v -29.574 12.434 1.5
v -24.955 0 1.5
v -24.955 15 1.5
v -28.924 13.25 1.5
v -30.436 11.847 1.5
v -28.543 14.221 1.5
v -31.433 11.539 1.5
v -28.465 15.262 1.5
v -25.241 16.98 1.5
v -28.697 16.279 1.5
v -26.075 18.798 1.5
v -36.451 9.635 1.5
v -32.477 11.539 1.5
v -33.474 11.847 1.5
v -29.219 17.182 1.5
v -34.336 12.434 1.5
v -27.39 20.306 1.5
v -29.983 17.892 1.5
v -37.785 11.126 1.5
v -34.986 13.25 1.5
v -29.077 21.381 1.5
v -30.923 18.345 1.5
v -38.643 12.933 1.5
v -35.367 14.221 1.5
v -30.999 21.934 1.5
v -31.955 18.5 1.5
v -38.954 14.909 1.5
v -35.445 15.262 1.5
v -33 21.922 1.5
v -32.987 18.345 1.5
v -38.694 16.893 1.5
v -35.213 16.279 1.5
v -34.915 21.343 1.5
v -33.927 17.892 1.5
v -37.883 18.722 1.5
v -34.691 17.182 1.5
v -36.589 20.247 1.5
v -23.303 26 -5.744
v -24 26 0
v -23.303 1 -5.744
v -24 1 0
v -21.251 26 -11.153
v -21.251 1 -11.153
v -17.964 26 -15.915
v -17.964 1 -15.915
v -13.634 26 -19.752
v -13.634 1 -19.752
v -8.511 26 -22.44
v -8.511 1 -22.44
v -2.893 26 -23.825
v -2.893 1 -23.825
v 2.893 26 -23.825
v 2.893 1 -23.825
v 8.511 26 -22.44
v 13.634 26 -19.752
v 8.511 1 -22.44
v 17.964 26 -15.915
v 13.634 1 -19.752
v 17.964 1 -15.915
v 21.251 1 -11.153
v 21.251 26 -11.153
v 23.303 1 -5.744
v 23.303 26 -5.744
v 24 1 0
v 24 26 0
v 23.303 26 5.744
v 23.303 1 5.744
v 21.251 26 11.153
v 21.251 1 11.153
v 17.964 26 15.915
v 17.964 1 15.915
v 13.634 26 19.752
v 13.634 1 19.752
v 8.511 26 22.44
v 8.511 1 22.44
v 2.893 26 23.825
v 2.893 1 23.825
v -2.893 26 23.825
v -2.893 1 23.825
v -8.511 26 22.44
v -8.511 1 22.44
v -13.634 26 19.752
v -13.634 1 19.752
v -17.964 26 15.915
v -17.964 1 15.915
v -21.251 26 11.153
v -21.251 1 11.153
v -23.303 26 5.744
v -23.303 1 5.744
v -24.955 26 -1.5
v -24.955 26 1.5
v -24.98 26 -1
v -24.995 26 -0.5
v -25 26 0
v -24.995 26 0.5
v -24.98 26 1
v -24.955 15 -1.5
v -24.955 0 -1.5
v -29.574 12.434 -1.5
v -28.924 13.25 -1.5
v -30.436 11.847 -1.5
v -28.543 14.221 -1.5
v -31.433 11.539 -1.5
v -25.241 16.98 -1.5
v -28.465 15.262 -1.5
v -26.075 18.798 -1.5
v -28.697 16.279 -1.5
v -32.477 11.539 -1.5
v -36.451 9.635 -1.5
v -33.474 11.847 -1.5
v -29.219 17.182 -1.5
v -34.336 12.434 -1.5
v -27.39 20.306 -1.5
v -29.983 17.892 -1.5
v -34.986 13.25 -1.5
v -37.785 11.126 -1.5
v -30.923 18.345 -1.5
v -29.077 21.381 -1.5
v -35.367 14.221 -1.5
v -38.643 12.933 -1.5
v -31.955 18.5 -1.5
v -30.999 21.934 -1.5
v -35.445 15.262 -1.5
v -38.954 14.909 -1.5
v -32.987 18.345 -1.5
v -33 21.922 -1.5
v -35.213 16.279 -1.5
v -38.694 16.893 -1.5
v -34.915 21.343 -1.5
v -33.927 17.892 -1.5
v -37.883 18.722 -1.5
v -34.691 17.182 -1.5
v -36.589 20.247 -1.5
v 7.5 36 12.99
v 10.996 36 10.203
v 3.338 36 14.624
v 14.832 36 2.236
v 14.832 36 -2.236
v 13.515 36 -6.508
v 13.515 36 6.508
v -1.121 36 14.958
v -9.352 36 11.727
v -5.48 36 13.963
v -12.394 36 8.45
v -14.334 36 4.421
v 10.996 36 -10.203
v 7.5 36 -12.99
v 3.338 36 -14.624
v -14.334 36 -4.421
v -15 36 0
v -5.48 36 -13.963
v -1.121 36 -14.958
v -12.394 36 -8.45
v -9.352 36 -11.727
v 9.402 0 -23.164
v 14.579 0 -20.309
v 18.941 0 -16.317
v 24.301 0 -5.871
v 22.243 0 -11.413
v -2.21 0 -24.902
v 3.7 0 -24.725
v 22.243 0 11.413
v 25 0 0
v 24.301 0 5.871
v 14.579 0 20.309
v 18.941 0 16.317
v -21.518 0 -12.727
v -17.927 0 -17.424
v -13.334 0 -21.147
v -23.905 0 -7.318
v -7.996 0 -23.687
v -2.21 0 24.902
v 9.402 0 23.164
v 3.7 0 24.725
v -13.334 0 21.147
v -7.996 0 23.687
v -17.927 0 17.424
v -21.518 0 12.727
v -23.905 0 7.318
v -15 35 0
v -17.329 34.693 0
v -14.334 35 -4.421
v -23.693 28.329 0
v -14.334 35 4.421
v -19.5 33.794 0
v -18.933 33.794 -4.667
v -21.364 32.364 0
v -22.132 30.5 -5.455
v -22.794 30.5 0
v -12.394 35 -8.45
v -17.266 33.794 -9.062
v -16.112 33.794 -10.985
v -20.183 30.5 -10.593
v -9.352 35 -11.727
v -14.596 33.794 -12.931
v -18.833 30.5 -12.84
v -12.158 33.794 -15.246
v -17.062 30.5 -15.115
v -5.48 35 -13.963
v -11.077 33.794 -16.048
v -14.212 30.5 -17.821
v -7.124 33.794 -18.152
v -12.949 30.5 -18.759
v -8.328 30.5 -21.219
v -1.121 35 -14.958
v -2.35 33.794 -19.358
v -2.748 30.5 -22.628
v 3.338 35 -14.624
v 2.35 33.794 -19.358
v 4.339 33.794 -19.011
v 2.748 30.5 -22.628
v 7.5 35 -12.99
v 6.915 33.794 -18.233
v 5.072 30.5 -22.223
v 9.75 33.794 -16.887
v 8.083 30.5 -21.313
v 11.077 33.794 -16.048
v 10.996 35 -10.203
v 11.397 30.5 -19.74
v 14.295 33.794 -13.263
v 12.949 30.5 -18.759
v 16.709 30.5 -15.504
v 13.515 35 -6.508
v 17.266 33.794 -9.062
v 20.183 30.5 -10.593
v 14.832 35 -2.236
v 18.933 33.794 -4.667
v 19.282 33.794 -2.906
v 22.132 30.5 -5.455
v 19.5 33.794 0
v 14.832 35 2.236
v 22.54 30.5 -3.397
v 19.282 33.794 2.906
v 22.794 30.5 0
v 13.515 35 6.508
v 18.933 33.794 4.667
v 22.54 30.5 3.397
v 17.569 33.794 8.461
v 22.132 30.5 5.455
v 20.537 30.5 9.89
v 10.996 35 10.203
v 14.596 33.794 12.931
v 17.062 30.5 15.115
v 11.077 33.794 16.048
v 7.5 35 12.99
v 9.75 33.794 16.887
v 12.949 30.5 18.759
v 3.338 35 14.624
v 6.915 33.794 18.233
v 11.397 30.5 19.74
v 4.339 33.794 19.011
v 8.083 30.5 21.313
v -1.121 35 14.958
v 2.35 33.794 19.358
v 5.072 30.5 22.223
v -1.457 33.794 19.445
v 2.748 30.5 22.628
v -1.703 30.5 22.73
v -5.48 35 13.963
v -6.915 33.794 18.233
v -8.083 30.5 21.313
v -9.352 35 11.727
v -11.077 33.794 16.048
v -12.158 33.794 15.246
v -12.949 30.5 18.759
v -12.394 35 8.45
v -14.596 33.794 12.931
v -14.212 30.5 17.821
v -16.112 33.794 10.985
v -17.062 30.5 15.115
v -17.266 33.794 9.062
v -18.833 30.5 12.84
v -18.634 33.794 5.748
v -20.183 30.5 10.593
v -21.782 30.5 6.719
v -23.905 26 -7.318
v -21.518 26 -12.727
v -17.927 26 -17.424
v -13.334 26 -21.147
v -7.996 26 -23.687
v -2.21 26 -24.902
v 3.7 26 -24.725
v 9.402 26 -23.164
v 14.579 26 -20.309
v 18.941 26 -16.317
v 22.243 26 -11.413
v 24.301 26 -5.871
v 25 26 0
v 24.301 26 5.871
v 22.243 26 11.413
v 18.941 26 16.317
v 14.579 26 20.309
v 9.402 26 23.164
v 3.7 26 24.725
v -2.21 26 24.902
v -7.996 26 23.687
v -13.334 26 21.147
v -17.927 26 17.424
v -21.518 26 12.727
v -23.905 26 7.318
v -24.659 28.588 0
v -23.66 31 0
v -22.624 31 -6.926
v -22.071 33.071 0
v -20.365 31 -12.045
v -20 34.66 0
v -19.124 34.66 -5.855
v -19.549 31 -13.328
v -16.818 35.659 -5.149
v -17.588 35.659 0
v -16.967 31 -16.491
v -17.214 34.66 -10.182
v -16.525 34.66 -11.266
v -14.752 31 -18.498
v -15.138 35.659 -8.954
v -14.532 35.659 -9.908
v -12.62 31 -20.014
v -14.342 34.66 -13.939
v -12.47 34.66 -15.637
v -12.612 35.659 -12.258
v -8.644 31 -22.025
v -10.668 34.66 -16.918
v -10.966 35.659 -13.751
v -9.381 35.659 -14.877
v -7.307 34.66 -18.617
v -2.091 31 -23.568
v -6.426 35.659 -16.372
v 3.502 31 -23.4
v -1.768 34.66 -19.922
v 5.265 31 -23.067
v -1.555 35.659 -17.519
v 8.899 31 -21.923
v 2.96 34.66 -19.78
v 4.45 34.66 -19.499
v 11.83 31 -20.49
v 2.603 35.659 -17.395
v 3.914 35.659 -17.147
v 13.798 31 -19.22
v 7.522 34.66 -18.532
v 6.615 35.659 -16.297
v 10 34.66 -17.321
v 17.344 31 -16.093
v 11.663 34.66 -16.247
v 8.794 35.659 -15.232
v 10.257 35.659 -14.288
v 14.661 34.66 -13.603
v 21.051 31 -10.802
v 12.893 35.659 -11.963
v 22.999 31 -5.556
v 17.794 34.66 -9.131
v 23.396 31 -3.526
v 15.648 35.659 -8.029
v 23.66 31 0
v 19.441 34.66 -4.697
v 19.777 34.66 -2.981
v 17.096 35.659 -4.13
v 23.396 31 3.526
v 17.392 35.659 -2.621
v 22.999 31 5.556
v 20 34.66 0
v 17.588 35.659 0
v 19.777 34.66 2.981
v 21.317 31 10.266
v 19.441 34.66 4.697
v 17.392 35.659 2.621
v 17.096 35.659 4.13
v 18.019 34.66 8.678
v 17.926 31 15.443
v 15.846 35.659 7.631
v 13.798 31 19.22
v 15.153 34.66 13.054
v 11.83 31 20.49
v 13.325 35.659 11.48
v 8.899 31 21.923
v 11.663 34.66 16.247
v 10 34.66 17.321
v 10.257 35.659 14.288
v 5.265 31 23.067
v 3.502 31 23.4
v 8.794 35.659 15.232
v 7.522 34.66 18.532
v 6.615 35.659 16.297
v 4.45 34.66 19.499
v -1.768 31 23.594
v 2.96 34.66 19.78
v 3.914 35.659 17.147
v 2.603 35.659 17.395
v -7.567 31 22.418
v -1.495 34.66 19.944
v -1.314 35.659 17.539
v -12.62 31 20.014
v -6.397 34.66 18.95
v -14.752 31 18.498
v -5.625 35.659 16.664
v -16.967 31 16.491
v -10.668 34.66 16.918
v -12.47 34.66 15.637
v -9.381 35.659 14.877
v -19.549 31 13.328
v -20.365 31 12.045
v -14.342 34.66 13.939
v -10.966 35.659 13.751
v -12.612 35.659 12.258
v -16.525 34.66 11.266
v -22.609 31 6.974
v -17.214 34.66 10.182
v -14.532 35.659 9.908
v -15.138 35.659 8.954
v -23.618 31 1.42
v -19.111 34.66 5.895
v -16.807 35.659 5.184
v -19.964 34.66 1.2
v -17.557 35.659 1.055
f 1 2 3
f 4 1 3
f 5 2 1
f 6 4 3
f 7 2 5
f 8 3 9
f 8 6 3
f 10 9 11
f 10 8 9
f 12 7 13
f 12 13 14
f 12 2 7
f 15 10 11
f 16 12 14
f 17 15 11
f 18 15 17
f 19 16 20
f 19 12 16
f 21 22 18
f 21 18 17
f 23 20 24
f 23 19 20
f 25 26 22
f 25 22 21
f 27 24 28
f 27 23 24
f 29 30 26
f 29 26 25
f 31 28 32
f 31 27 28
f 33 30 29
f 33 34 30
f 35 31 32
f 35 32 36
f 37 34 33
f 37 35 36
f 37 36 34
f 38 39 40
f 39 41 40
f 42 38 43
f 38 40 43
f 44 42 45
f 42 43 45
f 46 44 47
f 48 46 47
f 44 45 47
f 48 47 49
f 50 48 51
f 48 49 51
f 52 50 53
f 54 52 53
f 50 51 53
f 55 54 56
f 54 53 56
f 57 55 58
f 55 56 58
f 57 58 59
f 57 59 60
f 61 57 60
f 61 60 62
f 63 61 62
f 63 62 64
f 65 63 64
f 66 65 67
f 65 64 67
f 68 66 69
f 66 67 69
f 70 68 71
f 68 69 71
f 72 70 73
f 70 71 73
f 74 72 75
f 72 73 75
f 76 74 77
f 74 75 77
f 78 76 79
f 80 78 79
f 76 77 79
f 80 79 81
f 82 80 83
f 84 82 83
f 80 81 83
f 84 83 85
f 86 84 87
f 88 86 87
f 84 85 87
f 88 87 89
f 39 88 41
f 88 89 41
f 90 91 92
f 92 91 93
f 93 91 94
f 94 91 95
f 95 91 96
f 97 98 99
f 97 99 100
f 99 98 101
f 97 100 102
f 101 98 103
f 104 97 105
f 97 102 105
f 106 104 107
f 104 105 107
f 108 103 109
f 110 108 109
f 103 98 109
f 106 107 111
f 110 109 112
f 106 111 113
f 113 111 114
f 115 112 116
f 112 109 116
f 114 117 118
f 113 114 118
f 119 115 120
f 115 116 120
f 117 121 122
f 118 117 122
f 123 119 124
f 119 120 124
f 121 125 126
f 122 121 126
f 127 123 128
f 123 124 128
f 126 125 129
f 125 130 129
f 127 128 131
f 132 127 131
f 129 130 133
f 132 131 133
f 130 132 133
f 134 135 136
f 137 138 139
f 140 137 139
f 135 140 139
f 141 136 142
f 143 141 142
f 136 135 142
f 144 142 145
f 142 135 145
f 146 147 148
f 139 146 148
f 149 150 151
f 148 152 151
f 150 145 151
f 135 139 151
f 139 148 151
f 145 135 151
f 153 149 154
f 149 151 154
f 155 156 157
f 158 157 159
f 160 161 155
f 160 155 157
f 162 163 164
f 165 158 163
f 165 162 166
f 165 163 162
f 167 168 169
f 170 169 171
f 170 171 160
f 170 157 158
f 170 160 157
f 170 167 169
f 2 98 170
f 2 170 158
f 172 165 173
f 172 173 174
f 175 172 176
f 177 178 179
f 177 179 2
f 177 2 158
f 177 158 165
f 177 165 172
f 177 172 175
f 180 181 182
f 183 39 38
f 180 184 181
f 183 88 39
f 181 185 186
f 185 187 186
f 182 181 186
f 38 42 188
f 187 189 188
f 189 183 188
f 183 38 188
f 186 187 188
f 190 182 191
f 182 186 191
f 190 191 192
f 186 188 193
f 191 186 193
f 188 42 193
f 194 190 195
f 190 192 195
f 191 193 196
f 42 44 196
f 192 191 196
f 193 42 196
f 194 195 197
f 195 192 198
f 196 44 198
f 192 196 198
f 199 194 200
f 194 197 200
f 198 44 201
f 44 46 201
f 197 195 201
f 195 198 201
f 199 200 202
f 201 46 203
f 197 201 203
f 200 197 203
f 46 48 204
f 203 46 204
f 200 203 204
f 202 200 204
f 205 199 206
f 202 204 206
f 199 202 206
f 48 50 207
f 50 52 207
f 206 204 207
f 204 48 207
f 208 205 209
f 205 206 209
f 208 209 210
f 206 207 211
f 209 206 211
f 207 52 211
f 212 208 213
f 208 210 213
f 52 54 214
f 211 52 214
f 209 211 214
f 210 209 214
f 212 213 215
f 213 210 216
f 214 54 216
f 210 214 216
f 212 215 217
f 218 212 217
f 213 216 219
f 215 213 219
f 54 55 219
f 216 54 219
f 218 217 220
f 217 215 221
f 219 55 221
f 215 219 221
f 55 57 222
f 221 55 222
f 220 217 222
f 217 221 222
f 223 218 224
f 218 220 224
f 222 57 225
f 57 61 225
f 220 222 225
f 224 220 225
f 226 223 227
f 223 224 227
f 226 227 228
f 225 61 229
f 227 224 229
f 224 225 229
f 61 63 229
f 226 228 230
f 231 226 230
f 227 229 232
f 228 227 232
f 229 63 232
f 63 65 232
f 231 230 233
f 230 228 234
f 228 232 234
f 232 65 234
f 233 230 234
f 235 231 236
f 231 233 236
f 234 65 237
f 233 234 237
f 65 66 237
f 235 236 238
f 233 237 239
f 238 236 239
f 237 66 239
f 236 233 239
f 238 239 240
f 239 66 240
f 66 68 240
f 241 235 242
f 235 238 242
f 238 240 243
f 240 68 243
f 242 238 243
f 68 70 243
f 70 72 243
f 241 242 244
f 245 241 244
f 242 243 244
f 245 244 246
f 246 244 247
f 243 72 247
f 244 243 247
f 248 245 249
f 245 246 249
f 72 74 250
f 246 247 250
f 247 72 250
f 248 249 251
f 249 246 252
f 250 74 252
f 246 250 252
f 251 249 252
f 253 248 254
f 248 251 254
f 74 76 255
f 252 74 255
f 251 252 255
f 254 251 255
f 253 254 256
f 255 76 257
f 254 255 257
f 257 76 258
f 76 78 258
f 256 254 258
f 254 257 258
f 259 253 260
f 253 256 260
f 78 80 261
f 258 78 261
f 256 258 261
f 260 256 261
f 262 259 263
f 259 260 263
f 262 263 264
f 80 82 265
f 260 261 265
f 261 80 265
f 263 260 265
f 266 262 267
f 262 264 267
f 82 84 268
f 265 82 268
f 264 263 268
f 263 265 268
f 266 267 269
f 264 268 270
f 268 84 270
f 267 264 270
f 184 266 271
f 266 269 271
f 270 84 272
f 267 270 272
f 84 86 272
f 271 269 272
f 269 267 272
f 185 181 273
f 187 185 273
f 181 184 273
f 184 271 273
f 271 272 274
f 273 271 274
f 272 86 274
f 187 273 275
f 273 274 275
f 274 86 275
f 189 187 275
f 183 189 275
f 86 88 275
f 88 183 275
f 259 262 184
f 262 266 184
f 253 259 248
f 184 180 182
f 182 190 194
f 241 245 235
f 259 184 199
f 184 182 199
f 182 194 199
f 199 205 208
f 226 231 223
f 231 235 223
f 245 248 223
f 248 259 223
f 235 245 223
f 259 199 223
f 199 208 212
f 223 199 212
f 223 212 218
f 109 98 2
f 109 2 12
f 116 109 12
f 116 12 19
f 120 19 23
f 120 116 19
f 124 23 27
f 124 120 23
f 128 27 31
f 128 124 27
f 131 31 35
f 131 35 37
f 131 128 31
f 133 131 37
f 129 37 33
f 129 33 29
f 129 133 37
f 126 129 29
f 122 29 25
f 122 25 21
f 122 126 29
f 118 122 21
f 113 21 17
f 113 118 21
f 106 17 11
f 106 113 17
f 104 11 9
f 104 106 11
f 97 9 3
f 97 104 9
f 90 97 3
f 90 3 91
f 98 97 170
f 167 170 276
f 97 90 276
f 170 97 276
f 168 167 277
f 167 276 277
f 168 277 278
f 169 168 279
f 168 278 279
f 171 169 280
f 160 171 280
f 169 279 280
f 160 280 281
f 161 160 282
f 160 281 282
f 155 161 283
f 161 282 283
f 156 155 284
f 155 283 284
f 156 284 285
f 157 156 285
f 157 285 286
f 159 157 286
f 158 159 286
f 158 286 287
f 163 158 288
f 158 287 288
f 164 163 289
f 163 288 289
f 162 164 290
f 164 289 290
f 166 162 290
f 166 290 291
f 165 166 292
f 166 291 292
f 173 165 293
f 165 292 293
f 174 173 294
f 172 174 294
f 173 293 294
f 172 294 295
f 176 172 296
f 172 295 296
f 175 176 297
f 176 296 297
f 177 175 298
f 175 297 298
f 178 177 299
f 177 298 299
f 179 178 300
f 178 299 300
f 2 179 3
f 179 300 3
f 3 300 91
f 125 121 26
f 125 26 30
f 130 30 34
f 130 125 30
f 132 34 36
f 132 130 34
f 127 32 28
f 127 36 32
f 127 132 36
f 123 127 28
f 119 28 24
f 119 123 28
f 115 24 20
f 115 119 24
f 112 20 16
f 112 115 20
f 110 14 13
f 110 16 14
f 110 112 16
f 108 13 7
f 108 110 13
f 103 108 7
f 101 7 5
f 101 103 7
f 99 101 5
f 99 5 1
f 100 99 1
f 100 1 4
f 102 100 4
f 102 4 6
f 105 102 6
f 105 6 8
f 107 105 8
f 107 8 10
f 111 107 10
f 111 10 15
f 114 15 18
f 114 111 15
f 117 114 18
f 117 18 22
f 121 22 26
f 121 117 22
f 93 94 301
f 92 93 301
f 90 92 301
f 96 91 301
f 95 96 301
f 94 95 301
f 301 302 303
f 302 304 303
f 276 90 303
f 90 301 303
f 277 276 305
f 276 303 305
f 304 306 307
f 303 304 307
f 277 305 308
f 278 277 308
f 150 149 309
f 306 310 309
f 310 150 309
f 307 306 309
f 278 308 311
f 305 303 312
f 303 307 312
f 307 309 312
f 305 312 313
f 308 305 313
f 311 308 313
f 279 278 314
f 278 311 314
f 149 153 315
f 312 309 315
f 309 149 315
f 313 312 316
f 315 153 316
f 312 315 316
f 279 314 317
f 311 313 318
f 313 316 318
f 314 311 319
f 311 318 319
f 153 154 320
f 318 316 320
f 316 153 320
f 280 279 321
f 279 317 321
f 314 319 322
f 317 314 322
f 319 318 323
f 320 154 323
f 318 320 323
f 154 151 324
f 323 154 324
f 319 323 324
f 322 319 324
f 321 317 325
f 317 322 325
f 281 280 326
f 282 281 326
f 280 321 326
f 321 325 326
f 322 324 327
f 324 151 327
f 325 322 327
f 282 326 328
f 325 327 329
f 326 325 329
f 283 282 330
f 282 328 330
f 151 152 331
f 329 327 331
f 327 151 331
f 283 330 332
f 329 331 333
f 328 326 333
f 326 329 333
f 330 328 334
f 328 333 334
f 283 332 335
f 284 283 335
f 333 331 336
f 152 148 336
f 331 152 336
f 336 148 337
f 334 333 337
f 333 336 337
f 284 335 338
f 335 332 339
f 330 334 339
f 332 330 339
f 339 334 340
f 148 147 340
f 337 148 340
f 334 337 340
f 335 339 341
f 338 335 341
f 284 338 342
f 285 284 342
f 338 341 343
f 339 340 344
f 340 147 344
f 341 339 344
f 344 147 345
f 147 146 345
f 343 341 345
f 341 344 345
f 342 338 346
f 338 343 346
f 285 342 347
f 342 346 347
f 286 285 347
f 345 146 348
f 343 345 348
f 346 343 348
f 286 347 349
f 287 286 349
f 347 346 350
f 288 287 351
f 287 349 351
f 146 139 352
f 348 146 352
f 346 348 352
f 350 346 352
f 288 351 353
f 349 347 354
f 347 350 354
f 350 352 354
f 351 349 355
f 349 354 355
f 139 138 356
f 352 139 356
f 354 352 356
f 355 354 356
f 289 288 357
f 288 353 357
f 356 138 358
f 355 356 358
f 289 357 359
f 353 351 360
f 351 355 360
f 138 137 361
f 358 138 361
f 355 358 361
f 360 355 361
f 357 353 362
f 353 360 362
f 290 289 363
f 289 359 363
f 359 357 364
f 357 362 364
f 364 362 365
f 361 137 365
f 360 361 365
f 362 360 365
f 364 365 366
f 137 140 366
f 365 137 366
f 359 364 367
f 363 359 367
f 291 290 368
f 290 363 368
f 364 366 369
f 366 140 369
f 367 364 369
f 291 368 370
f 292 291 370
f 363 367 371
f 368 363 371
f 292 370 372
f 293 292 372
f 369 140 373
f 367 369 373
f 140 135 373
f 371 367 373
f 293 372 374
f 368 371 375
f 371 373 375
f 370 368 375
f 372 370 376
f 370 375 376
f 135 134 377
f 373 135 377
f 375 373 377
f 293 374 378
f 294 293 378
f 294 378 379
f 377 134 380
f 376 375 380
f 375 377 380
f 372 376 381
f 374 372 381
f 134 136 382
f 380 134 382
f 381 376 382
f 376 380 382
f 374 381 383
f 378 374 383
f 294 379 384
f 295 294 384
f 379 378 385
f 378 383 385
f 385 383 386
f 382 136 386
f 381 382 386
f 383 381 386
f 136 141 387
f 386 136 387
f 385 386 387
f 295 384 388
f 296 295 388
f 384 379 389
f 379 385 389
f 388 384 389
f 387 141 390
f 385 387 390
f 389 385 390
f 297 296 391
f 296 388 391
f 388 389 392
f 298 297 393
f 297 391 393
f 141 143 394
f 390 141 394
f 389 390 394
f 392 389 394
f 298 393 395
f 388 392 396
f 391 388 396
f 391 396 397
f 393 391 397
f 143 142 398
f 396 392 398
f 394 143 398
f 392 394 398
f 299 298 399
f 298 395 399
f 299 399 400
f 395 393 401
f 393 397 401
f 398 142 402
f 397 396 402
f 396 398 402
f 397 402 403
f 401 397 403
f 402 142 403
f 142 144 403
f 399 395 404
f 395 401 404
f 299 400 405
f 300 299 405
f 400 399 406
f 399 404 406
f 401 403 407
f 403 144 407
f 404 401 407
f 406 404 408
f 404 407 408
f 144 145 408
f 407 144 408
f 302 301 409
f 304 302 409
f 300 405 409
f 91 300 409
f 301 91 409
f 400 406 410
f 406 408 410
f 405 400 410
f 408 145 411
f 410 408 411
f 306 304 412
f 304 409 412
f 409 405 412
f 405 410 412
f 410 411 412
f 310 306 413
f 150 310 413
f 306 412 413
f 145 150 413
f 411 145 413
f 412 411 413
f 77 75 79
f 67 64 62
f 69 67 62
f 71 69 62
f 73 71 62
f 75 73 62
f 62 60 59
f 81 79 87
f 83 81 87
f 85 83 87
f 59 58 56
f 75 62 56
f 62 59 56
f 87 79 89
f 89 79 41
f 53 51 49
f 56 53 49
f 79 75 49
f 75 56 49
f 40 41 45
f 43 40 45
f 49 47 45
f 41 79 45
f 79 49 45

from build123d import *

# Parameters (mm, degrees)
SKETCH5_W                            = 3
SKETCH5_H                            = 26
BOSS_EXTRUDE1_DEPTH                  = 15
BOSS_EXTRUDE1_DIRECTION_2_REACH      = 68.491
BOSS_EXTRUDE1_DIRECTION_2_END_RADIUS = 25
CUT_EXTRUDE1_DEPTH                   = 60.338014797
CUT_EXTRUDE1_DEPTH_BACK              = 60.338014797
SKETCH4_R                            = 3.5


with BuildPart() as part:
    # Sketch1 → Revolve1 (revolve)
    with BuildSketch(Plane.XY, mode=Mode.PRIVATE) as revolve1_sk:
        with BuildLine():
            Line((0, 0), (25, 0))
            Line((25, 0), (25, 26))
            ThreePointArc((25, 26), (22.071067812, 33.071067812), (15, 36))
            Line((15, 36), (0, 36))
            Line((0, 36), (0, 35))
            Line((0, 35), (1, 35))
            Line((1, 35), (15, 35))
            ThreePointArc((15, 35), (21.363961031, 32.363961031), (24, 26))
            Line((24, 26), (24, 1))
            Line((24, 1), (1, 1))
            Line((1, 1), (0, 1))
            Line((0, 1), (0, 0))
        make_face()
    revolve(revolve1_sk.sketch.rotate(Axis((0, 36, 0), (0, -1, 0)), 180), axis=Axis((0, 36, 0), (0, -1, 0)))

    # Sketch5 → Boss-Extrude1 (add)
    with BuildSketch(Plane.ZY.offset(25)):
        with Locations((0, 13)):
            Rectangle(SKETCH5_W, SKETCH5_H)
    extrude(amount=BOSS_EXTRUDE1_DEPTH)

    # Boss-Extrude1 direction 2: up to this cylinder (the profile starts outside it)
    boss_extrude1_direction_2_end = Plane(origin=(0, 13, 0), z_dir=(0, 1, 0)) * Cylinder(BOSS_EXTRUDE1_DIRECTION_2_END_RADIUS, 187.982, mode=Mode.PRIVATE)
    # Sketch5 → Boss-Extrude1 direction 2 (add, up to the surface)
    with BuildSketch(Plane.ZY.offset(25), mode=Mode.PRIVATE) as boss_extrude1_direction_2_sk1:
        with Locations((0, 13)):
            Rectangle(SKETCH5_W, SKETCH5_H)
    boss_extrude1_direction_2_tool1 = extrude(boss_extrude1_direction_2_sk1.sketch, amount=-BOSS_EXTRUDE1_DIRECTION_2_REACH, mode=Mode.PRIVATE) - boss_extrude1_direction_2_end
    add(boss_extrude1_direction_2_tool1.solids().sort_by_distance((-25, 13, 0))[0])
    add(boss_extrude1_direction_2_tool1.solids().sort_by_distance((-25, 13, 0))[1])

    # Sketch4 → Cut-Extrude1 (cut, two sides: drawn at the far end of the back side and taken through both)
    with BuildSketch(Plane.XY.offset(-CUT_EXTRUDE1_DEPTH_BACK)):
        with Locations(Location((-31.954959427, 15, 0), (0, 0, 90))):
            Circle(SKETCH4_R)
        with BuildLine():
            Line((-24.954959427, 0), (-36.451309792, 9.635036496))
            ThreePointArc((-36.451309792, 9.635036496), (-34.915157684, 21.34328198), (-24.954959427, 15))
            Line((-24.954959427, 15), (-24.954959427, 26))
            Line((-24.954959427, 26), (-40, 26))
            Line((-40, 26), (-40, 0))
            Line((-40, 0), (-24.954959427, 0))
        make_face()
    extrude(amount=CUT_EXTRUDE1_DEPTH + CUT_EXTRUDE1_DEPTH_BACK, mode=Mode.SUBTRACT)


solid = part.part
